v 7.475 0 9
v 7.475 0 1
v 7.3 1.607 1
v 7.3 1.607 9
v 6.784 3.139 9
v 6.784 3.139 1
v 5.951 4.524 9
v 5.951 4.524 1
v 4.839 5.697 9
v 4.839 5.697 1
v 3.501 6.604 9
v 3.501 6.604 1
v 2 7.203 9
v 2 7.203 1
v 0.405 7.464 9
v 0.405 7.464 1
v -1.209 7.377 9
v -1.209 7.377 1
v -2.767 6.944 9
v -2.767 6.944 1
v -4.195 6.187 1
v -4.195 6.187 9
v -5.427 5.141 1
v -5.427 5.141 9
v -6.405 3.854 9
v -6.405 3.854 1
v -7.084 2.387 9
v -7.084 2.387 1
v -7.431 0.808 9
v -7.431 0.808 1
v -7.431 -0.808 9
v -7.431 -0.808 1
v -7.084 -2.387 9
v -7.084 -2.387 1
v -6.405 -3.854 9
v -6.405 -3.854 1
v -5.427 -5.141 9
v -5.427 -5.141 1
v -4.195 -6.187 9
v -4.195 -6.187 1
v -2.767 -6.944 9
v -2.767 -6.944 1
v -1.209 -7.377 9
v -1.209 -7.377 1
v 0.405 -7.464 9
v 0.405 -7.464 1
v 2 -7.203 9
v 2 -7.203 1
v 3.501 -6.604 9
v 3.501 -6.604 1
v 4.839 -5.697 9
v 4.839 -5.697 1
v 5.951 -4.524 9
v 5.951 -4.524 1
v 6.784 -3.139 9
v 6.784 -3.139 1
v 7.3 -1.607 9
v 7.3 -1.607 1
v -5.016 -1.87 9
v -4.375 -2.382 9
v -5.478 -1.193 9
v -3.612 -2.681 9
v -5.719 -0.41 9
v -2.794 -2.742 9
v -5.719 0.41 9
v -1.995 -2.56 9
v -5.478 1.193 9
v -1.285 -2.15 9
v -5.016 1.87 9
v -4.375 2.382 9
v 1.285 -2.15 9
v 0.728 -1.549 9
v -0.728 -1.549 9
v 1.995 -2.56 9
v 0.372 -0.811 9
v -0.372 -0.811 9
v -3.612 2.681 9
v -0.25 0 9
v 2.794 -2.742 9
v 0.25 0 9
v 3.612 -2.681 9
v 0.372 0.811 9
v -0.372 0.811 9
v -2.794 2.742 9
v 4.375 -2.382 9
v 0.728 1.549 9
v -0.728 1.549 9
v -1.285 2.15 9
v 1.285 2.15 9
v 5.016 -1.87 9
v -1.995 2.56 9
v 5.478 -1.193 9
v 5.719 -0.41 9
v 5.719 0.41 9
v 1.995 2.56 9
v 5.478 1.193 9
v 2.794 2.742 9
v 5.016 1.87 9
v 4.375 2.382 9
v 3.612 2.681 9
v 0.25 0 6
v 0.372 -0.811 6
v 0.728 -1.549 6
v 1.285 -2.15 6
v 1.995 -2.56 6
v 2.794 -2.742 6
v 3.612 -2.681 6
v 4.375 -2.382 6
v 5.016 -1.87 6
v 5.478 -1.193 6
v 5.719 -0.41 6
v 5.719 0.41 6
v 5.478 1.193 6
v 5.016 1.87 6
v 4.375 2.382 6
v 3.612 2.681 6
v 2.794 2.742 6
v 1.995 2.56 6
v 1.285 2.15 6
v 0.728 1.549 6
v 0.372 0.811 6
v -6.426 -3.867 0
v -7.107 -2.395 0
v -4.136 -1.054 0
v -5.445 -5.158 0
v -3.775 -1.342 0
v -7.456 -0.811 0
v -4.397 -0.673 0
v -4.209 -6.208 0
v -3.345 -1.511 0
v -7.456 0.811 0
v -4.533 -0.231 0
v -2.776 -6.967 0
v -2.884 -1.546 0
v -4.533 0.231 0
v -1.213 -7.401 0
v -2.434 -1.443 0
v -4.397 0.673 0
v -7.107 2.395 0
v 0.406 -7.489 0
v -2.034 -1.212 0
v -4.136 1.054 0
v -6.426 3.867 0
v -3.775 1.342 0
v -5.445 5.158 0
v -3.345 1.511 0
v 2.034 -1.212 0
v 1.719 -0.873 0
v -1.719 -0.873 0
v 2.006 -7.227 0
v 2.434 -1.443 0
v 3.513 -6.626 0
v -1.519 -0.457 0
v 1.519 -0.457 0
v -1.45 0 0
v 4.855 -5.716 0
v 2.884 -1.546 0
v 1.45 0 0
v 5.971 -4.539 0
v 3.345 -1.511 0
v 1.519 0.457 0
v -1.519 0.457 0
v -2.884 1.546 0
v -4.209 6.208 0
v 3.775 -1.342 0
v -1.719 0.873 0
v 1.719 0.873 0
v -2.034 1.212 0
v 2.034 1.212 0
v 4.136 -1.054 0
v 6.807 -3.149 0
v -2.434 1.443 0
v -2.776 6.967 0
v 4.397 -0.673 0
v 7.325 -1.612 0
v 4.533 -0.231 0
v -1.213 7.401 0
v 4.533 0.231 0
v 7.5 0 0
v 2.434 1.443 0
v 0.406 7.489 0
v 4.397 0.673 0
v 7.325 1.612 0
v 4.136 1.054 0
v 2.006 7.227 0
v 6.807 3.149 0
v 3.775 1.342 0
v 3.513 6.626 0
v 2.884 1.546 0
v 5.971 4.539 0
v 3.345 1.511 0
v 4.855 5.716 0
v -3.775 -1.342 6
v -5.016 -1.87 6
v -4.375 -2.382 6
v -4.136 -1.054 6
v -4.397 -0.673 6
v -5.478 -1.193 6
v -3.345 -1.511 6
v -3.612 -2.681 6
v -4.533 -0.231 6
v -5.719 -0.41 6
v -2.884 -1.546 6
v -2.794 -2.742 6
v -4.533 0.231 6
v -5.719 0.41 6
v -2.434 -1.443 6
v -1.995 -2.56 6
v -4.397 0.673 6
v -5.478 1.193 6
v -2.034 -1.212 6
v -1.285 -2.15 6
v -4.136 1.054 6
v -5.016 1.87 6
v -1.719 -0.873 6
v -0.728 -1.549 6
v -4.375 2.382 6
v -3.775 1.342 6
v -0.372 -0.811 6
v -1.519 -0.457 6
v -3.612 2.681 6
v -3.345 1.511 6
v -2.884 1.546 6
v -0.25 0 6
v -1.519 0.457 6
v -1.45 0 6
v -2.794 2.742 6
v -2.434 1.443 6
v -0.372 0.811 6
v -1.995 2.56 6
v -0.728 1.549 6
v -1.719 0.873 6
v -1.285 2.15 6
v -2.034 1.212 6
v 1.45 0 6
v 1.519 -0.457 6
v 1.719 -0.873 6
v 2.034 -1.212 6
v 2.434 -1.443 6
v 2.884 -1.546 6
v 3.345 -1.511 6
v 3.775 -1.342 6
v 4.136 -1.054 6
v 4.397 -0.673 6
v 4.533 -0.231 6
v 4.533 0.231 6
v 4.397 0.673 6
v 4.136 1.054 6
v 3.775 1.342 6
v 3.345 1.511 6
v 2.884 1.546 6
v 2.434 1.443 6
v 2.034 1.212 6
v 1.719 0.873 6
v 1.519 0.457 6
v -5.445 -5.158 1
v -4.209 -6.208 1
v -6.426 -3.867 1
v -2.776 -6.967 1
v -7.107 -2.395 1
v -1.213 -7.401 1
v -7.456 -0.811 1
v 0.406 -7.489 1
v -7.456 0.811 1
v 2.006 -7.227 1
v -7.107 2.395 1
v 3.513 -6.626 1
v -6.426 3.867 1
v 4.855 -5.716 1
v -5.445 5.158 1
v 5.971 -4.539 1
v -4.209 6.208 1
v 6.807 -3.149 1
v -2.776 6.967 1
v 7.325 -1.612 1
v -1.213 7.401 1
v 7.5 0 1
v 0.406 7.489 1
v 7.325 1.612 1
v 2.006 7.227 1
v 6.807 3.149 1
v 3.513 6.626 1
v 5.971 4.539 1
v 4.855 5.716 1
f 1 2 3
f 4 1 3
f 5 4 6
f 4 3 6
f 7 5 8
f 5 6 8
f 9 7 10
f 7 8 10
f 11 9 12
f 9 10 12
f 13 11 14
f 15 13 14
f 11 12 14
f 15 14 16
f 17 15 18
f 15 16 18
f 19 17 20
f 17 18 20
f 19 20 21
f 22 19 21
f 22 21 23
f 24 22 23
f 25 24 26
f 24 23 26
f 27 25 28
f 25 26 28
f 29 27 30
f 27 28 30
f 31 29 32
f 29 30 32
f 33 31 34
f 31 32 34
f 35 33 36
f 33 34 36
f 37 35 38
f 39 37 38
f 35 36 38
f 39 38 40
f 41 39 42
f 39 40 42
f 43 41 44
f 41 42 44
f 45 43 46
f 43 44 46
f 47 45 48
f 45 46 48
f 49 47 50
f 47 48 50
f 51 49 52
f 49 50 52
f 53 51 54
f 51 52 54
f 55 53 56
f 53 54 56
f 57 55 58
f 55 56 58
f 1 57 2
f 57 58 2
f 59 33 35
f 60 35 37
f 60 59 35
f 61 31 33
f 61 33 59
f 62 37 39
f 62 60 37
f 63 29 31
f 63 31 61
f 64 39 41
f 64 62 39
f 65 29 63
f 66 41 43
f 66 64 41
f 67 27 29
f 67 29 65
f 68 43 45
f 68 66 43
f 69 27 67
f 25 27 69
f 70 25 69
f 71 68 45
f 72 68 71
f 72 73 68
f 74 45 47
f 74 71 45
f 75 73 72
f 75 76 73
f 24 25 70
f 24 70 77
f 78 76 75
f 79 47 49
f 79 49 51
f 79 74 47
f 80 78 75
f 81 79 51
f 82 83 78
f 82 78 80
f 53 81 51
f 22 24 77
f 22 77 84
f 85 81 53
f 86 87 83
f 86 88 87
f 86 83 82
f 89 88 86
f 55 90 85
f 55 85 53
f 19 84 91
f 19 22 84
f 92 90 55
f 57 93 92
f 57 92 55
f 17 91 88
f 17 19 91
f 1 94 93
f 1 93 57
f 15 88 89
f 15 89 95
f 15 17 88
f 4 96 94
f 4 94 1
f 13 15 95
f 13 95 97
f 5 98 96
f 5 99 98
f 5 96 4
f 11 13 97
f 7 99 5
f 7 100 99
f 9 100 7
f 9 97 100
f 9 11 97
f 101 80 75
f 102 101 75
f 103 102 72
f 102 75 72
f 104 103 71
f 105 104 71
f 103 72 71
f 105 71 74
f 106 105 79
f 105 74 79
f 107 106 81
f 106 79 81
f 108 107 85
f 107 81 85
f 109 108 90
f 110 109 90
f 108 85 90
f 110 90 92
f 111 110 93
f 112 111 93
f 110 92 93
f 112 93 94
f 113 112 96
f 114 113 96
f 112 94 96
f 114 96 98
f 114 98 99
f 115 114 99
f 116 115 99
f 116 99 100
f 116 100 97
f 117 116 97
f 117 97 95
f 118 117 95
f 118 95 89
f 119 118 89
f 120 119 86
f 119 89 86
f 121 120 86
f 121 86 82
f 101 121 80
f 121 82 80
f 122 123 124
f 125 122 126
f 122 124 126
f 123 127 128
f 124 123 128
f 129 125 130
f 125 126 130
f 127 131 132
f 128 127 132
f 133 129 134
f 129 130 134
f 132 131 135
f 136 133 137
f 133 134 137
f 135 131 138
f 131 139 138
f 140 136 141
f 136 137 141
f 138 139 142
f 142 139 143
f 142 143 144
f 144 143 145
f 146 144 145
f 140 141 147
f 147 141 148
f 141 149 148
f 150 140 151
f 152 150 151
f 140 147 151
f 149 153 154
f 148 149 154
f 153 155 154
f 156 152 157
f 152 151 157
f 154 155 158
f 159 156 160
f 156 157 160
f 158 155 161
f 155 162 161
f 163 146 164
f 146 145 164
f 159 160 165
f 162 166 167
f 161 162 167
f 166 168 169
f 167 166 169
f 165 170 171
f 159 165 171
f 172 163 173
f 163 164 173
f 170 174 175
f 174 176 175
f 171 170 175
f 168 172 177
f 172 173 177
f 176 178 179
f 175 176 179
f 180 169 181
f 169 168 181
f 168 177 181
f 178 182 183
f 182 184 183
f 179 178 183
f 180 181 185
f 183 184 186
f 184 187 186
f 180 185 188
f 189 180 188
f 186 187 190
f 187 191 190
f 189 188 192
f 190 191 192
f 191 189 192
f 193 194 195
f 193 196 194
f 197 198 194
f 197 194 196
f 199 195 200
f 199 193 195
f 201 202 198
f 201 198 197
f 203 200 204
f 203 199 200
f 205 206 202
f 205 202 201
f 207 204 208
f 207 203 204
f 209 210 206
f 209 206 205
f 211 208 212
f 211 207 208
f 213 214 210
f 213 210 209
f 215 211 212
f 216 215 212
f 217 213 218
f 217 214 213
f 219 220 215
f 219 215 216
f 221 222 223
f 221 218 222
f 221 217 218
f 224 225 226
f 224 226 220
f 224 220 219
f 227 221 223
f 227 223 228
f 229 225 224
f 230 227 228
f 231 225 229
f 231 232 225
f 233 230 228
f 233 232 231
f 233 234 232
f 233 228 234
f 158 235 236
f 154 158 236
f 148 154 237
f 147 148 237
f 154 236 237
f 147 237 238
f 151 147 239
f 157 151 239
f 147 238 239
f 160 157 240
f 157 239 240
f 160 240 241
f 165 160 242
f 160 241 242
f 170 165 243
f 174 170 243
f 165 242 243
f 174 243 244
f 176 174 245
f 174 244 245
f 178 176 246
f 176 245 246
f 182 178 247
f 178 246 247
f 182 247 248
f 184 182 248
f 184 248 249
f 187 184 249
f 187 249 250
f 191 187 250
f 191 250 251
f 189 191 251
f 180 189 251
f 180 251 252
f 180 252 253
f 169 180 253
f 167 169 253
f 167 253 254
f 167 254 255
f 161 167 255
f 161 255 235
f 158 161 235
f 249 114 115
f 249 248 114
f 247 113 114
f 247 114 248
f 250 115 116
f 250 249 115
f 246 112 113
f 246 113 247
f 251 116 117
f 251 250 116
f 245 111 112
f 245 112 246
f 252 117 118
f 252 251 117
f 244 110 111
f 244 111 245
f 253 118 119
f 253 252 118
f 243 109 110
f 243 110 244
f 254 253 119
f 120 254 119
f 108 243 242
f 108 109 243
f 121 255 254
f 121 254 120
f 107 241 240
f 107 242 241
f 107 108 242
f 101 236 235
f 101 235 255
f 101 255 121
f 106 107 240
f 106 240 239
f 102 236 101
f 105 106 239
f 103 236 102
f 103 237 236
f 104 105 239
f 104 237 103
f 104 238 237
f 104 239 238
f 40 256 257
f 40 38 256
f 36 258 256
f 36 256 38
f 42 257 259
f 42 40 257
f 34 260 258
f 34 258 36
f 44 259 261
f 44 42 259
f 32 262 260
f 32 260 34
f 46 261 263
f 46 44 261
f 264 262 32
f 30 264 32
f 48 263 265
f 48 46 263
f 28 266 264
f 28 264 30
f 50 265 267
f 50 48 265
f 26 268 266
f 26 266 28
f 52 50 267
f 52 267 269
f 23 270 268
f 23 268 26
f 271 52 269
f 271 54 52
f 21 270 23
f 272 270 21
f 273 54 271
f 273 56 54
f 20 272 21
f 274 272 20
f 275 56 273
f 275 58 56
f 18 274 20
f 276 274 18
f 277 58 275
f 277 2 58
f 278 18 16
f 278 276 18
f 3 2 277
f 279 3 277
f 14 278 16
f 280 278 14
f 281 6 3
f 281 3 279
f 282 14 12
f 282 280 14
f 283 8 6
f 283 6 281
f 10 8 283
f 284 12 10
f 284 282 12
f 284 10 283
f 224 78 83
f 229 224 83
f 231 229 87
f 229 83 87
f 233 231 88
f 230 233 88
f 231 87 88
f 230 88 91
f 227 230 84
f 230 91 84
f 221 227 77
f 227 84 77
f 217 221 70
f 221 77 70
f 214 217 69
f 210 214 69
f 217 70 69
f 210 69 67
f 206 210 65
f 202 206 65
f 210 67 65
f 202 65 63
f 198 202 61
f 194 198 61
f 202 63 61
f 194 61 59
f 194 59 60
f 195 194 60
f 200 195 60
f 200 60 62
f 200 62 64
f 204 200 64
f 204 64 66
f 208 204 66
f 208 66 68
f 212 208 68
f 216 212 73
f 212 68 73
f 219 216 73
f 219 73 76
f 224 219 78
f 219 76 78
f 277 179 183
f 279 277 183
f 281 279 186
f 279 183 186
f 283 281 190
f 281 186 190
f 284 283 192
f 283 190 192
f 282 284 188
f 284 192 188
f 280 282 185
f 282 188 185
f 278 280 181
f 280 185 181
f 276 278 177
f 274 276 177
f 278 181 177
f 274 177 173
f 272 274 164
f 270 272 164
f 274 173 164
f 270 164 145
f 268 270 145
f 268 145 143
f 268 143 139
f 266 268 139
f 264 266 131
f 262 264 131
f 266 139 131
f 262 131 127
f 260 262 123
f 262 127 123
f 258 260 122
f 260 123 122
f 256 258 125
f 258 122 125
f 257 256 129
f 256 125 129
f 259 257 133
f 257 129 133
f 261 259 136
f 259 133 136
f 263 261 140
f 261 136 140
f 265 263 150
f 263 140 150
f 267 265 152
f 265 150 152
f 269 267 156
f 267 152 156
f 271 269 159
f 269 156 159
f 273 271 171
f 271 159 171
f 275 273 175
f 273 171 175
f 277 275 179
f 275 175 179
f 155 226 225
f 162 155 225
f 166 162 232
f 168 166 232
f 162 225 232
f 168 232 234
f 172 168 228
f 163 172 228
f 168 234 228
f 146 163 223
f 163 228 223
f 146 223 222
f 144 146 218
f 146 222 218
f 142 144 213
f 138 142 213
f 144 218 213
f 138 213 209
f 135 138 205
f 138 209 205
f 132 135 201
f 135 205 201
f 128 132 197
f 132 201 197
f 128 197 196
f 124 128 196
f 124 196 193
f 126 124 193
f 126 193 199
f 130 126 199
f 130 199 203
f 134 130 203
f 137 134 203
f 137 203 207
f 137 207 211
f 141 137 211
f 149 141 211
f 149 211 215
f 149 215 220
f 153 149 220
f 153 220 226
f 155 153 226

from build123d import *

# Parameters (mm, degrees)
SKETCH1_R           = 7.5
BOSS_EXTRUDE1_DEPTH = 1
SKETCH2_R           = 7.475
BOSS_EXTRUDE2_DEPTH = 8
SKETCH3_R           = 1.55
CUT_EXTRUDE1_DEPTH  = 14.910427743
SKETCH4_R           = 2.75
CUT_EXTRUDE2_DEPTH  = 3


with BuildPart() as part:
    # Sketch1 → Boss-Extrude1 (new body)
    with BuildSketch(Plane.XY):
        Circle(SKETCH1_R)
    extrude(amount=BOSS_EXTRUDE1_DEPTH)

    # Sketch2 → Boss-Extrude2 (add)
    with BuildSketch(Plane.XY.offset(1)):
        Circle(SKETCH2_R)
    extrude(amount=BOSS_EXTRUDE2_DEPTH)

    # Sketch3 → Cut-Extrude1 (cut, through all)
    with BuildSketch(Plane.XY.offset(9)):
        with Locations((-3, 0)):
            Circle(SKETCH3_R)
        with Locations(Location((3, 0, 0), (0, 0, 180))):
            Circle(SKETCH3_R)
    extrude(amount=-CUT_EXTRUDE1_DEPTH, mode=Mode.SUBTRACT)

    # Sketch4 → Cut-Extrude2 (cut)
    with BuildSketch(Plane.XY.offset(9)):
        with Locations((-3, 0)):
            Circle(SKETCH4_R)
        with Locations(Location((3, 0, 0), (0, 0, 180))):
            Circle(SKETCH4_R)
    extrude(amount=-CUT_EXTRUDE2_DEPTH, mode=Mode.SUBTRACT)


solid = part.part
